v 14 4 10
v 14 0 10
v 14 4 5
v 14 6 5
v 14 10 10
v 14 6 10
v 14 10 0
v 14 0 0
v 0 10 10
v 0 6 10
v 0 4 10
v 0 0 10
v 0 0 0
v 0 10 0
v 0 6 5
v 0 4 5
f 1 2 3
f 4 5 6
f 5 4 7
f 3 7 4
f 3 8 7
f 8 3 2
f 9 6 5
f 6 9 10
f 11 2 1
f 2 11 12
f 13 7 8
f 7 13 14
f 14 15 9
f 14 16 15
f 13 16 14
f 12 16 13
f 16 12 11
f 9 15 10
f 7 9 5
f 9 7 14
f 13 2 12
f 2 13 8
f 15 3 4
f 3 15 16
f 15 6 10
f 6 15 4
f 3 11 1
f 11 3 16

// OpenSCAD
$fn = 32;

// ----------------------------------------------------------------------
// Micro clip: slotted block, 5-20 mm class
// ----------------------------------------------------------------------

// --- parameters (mm) ---
block_l = 14;             // block length, X
block_w = 10;             // block width, Y
block_h = 10;             // block height, Z
slot_w = 2;               // slot width
slot_d = 5;               // slot depth from the top

difference() {
  cube([block_l, block_w, block_h]);
  translate([-1, block_w / 2 - slot_w / 2, block_h - slot_d])
    cube([block_l + 2, slot_w, slot_d + 1]);
}
